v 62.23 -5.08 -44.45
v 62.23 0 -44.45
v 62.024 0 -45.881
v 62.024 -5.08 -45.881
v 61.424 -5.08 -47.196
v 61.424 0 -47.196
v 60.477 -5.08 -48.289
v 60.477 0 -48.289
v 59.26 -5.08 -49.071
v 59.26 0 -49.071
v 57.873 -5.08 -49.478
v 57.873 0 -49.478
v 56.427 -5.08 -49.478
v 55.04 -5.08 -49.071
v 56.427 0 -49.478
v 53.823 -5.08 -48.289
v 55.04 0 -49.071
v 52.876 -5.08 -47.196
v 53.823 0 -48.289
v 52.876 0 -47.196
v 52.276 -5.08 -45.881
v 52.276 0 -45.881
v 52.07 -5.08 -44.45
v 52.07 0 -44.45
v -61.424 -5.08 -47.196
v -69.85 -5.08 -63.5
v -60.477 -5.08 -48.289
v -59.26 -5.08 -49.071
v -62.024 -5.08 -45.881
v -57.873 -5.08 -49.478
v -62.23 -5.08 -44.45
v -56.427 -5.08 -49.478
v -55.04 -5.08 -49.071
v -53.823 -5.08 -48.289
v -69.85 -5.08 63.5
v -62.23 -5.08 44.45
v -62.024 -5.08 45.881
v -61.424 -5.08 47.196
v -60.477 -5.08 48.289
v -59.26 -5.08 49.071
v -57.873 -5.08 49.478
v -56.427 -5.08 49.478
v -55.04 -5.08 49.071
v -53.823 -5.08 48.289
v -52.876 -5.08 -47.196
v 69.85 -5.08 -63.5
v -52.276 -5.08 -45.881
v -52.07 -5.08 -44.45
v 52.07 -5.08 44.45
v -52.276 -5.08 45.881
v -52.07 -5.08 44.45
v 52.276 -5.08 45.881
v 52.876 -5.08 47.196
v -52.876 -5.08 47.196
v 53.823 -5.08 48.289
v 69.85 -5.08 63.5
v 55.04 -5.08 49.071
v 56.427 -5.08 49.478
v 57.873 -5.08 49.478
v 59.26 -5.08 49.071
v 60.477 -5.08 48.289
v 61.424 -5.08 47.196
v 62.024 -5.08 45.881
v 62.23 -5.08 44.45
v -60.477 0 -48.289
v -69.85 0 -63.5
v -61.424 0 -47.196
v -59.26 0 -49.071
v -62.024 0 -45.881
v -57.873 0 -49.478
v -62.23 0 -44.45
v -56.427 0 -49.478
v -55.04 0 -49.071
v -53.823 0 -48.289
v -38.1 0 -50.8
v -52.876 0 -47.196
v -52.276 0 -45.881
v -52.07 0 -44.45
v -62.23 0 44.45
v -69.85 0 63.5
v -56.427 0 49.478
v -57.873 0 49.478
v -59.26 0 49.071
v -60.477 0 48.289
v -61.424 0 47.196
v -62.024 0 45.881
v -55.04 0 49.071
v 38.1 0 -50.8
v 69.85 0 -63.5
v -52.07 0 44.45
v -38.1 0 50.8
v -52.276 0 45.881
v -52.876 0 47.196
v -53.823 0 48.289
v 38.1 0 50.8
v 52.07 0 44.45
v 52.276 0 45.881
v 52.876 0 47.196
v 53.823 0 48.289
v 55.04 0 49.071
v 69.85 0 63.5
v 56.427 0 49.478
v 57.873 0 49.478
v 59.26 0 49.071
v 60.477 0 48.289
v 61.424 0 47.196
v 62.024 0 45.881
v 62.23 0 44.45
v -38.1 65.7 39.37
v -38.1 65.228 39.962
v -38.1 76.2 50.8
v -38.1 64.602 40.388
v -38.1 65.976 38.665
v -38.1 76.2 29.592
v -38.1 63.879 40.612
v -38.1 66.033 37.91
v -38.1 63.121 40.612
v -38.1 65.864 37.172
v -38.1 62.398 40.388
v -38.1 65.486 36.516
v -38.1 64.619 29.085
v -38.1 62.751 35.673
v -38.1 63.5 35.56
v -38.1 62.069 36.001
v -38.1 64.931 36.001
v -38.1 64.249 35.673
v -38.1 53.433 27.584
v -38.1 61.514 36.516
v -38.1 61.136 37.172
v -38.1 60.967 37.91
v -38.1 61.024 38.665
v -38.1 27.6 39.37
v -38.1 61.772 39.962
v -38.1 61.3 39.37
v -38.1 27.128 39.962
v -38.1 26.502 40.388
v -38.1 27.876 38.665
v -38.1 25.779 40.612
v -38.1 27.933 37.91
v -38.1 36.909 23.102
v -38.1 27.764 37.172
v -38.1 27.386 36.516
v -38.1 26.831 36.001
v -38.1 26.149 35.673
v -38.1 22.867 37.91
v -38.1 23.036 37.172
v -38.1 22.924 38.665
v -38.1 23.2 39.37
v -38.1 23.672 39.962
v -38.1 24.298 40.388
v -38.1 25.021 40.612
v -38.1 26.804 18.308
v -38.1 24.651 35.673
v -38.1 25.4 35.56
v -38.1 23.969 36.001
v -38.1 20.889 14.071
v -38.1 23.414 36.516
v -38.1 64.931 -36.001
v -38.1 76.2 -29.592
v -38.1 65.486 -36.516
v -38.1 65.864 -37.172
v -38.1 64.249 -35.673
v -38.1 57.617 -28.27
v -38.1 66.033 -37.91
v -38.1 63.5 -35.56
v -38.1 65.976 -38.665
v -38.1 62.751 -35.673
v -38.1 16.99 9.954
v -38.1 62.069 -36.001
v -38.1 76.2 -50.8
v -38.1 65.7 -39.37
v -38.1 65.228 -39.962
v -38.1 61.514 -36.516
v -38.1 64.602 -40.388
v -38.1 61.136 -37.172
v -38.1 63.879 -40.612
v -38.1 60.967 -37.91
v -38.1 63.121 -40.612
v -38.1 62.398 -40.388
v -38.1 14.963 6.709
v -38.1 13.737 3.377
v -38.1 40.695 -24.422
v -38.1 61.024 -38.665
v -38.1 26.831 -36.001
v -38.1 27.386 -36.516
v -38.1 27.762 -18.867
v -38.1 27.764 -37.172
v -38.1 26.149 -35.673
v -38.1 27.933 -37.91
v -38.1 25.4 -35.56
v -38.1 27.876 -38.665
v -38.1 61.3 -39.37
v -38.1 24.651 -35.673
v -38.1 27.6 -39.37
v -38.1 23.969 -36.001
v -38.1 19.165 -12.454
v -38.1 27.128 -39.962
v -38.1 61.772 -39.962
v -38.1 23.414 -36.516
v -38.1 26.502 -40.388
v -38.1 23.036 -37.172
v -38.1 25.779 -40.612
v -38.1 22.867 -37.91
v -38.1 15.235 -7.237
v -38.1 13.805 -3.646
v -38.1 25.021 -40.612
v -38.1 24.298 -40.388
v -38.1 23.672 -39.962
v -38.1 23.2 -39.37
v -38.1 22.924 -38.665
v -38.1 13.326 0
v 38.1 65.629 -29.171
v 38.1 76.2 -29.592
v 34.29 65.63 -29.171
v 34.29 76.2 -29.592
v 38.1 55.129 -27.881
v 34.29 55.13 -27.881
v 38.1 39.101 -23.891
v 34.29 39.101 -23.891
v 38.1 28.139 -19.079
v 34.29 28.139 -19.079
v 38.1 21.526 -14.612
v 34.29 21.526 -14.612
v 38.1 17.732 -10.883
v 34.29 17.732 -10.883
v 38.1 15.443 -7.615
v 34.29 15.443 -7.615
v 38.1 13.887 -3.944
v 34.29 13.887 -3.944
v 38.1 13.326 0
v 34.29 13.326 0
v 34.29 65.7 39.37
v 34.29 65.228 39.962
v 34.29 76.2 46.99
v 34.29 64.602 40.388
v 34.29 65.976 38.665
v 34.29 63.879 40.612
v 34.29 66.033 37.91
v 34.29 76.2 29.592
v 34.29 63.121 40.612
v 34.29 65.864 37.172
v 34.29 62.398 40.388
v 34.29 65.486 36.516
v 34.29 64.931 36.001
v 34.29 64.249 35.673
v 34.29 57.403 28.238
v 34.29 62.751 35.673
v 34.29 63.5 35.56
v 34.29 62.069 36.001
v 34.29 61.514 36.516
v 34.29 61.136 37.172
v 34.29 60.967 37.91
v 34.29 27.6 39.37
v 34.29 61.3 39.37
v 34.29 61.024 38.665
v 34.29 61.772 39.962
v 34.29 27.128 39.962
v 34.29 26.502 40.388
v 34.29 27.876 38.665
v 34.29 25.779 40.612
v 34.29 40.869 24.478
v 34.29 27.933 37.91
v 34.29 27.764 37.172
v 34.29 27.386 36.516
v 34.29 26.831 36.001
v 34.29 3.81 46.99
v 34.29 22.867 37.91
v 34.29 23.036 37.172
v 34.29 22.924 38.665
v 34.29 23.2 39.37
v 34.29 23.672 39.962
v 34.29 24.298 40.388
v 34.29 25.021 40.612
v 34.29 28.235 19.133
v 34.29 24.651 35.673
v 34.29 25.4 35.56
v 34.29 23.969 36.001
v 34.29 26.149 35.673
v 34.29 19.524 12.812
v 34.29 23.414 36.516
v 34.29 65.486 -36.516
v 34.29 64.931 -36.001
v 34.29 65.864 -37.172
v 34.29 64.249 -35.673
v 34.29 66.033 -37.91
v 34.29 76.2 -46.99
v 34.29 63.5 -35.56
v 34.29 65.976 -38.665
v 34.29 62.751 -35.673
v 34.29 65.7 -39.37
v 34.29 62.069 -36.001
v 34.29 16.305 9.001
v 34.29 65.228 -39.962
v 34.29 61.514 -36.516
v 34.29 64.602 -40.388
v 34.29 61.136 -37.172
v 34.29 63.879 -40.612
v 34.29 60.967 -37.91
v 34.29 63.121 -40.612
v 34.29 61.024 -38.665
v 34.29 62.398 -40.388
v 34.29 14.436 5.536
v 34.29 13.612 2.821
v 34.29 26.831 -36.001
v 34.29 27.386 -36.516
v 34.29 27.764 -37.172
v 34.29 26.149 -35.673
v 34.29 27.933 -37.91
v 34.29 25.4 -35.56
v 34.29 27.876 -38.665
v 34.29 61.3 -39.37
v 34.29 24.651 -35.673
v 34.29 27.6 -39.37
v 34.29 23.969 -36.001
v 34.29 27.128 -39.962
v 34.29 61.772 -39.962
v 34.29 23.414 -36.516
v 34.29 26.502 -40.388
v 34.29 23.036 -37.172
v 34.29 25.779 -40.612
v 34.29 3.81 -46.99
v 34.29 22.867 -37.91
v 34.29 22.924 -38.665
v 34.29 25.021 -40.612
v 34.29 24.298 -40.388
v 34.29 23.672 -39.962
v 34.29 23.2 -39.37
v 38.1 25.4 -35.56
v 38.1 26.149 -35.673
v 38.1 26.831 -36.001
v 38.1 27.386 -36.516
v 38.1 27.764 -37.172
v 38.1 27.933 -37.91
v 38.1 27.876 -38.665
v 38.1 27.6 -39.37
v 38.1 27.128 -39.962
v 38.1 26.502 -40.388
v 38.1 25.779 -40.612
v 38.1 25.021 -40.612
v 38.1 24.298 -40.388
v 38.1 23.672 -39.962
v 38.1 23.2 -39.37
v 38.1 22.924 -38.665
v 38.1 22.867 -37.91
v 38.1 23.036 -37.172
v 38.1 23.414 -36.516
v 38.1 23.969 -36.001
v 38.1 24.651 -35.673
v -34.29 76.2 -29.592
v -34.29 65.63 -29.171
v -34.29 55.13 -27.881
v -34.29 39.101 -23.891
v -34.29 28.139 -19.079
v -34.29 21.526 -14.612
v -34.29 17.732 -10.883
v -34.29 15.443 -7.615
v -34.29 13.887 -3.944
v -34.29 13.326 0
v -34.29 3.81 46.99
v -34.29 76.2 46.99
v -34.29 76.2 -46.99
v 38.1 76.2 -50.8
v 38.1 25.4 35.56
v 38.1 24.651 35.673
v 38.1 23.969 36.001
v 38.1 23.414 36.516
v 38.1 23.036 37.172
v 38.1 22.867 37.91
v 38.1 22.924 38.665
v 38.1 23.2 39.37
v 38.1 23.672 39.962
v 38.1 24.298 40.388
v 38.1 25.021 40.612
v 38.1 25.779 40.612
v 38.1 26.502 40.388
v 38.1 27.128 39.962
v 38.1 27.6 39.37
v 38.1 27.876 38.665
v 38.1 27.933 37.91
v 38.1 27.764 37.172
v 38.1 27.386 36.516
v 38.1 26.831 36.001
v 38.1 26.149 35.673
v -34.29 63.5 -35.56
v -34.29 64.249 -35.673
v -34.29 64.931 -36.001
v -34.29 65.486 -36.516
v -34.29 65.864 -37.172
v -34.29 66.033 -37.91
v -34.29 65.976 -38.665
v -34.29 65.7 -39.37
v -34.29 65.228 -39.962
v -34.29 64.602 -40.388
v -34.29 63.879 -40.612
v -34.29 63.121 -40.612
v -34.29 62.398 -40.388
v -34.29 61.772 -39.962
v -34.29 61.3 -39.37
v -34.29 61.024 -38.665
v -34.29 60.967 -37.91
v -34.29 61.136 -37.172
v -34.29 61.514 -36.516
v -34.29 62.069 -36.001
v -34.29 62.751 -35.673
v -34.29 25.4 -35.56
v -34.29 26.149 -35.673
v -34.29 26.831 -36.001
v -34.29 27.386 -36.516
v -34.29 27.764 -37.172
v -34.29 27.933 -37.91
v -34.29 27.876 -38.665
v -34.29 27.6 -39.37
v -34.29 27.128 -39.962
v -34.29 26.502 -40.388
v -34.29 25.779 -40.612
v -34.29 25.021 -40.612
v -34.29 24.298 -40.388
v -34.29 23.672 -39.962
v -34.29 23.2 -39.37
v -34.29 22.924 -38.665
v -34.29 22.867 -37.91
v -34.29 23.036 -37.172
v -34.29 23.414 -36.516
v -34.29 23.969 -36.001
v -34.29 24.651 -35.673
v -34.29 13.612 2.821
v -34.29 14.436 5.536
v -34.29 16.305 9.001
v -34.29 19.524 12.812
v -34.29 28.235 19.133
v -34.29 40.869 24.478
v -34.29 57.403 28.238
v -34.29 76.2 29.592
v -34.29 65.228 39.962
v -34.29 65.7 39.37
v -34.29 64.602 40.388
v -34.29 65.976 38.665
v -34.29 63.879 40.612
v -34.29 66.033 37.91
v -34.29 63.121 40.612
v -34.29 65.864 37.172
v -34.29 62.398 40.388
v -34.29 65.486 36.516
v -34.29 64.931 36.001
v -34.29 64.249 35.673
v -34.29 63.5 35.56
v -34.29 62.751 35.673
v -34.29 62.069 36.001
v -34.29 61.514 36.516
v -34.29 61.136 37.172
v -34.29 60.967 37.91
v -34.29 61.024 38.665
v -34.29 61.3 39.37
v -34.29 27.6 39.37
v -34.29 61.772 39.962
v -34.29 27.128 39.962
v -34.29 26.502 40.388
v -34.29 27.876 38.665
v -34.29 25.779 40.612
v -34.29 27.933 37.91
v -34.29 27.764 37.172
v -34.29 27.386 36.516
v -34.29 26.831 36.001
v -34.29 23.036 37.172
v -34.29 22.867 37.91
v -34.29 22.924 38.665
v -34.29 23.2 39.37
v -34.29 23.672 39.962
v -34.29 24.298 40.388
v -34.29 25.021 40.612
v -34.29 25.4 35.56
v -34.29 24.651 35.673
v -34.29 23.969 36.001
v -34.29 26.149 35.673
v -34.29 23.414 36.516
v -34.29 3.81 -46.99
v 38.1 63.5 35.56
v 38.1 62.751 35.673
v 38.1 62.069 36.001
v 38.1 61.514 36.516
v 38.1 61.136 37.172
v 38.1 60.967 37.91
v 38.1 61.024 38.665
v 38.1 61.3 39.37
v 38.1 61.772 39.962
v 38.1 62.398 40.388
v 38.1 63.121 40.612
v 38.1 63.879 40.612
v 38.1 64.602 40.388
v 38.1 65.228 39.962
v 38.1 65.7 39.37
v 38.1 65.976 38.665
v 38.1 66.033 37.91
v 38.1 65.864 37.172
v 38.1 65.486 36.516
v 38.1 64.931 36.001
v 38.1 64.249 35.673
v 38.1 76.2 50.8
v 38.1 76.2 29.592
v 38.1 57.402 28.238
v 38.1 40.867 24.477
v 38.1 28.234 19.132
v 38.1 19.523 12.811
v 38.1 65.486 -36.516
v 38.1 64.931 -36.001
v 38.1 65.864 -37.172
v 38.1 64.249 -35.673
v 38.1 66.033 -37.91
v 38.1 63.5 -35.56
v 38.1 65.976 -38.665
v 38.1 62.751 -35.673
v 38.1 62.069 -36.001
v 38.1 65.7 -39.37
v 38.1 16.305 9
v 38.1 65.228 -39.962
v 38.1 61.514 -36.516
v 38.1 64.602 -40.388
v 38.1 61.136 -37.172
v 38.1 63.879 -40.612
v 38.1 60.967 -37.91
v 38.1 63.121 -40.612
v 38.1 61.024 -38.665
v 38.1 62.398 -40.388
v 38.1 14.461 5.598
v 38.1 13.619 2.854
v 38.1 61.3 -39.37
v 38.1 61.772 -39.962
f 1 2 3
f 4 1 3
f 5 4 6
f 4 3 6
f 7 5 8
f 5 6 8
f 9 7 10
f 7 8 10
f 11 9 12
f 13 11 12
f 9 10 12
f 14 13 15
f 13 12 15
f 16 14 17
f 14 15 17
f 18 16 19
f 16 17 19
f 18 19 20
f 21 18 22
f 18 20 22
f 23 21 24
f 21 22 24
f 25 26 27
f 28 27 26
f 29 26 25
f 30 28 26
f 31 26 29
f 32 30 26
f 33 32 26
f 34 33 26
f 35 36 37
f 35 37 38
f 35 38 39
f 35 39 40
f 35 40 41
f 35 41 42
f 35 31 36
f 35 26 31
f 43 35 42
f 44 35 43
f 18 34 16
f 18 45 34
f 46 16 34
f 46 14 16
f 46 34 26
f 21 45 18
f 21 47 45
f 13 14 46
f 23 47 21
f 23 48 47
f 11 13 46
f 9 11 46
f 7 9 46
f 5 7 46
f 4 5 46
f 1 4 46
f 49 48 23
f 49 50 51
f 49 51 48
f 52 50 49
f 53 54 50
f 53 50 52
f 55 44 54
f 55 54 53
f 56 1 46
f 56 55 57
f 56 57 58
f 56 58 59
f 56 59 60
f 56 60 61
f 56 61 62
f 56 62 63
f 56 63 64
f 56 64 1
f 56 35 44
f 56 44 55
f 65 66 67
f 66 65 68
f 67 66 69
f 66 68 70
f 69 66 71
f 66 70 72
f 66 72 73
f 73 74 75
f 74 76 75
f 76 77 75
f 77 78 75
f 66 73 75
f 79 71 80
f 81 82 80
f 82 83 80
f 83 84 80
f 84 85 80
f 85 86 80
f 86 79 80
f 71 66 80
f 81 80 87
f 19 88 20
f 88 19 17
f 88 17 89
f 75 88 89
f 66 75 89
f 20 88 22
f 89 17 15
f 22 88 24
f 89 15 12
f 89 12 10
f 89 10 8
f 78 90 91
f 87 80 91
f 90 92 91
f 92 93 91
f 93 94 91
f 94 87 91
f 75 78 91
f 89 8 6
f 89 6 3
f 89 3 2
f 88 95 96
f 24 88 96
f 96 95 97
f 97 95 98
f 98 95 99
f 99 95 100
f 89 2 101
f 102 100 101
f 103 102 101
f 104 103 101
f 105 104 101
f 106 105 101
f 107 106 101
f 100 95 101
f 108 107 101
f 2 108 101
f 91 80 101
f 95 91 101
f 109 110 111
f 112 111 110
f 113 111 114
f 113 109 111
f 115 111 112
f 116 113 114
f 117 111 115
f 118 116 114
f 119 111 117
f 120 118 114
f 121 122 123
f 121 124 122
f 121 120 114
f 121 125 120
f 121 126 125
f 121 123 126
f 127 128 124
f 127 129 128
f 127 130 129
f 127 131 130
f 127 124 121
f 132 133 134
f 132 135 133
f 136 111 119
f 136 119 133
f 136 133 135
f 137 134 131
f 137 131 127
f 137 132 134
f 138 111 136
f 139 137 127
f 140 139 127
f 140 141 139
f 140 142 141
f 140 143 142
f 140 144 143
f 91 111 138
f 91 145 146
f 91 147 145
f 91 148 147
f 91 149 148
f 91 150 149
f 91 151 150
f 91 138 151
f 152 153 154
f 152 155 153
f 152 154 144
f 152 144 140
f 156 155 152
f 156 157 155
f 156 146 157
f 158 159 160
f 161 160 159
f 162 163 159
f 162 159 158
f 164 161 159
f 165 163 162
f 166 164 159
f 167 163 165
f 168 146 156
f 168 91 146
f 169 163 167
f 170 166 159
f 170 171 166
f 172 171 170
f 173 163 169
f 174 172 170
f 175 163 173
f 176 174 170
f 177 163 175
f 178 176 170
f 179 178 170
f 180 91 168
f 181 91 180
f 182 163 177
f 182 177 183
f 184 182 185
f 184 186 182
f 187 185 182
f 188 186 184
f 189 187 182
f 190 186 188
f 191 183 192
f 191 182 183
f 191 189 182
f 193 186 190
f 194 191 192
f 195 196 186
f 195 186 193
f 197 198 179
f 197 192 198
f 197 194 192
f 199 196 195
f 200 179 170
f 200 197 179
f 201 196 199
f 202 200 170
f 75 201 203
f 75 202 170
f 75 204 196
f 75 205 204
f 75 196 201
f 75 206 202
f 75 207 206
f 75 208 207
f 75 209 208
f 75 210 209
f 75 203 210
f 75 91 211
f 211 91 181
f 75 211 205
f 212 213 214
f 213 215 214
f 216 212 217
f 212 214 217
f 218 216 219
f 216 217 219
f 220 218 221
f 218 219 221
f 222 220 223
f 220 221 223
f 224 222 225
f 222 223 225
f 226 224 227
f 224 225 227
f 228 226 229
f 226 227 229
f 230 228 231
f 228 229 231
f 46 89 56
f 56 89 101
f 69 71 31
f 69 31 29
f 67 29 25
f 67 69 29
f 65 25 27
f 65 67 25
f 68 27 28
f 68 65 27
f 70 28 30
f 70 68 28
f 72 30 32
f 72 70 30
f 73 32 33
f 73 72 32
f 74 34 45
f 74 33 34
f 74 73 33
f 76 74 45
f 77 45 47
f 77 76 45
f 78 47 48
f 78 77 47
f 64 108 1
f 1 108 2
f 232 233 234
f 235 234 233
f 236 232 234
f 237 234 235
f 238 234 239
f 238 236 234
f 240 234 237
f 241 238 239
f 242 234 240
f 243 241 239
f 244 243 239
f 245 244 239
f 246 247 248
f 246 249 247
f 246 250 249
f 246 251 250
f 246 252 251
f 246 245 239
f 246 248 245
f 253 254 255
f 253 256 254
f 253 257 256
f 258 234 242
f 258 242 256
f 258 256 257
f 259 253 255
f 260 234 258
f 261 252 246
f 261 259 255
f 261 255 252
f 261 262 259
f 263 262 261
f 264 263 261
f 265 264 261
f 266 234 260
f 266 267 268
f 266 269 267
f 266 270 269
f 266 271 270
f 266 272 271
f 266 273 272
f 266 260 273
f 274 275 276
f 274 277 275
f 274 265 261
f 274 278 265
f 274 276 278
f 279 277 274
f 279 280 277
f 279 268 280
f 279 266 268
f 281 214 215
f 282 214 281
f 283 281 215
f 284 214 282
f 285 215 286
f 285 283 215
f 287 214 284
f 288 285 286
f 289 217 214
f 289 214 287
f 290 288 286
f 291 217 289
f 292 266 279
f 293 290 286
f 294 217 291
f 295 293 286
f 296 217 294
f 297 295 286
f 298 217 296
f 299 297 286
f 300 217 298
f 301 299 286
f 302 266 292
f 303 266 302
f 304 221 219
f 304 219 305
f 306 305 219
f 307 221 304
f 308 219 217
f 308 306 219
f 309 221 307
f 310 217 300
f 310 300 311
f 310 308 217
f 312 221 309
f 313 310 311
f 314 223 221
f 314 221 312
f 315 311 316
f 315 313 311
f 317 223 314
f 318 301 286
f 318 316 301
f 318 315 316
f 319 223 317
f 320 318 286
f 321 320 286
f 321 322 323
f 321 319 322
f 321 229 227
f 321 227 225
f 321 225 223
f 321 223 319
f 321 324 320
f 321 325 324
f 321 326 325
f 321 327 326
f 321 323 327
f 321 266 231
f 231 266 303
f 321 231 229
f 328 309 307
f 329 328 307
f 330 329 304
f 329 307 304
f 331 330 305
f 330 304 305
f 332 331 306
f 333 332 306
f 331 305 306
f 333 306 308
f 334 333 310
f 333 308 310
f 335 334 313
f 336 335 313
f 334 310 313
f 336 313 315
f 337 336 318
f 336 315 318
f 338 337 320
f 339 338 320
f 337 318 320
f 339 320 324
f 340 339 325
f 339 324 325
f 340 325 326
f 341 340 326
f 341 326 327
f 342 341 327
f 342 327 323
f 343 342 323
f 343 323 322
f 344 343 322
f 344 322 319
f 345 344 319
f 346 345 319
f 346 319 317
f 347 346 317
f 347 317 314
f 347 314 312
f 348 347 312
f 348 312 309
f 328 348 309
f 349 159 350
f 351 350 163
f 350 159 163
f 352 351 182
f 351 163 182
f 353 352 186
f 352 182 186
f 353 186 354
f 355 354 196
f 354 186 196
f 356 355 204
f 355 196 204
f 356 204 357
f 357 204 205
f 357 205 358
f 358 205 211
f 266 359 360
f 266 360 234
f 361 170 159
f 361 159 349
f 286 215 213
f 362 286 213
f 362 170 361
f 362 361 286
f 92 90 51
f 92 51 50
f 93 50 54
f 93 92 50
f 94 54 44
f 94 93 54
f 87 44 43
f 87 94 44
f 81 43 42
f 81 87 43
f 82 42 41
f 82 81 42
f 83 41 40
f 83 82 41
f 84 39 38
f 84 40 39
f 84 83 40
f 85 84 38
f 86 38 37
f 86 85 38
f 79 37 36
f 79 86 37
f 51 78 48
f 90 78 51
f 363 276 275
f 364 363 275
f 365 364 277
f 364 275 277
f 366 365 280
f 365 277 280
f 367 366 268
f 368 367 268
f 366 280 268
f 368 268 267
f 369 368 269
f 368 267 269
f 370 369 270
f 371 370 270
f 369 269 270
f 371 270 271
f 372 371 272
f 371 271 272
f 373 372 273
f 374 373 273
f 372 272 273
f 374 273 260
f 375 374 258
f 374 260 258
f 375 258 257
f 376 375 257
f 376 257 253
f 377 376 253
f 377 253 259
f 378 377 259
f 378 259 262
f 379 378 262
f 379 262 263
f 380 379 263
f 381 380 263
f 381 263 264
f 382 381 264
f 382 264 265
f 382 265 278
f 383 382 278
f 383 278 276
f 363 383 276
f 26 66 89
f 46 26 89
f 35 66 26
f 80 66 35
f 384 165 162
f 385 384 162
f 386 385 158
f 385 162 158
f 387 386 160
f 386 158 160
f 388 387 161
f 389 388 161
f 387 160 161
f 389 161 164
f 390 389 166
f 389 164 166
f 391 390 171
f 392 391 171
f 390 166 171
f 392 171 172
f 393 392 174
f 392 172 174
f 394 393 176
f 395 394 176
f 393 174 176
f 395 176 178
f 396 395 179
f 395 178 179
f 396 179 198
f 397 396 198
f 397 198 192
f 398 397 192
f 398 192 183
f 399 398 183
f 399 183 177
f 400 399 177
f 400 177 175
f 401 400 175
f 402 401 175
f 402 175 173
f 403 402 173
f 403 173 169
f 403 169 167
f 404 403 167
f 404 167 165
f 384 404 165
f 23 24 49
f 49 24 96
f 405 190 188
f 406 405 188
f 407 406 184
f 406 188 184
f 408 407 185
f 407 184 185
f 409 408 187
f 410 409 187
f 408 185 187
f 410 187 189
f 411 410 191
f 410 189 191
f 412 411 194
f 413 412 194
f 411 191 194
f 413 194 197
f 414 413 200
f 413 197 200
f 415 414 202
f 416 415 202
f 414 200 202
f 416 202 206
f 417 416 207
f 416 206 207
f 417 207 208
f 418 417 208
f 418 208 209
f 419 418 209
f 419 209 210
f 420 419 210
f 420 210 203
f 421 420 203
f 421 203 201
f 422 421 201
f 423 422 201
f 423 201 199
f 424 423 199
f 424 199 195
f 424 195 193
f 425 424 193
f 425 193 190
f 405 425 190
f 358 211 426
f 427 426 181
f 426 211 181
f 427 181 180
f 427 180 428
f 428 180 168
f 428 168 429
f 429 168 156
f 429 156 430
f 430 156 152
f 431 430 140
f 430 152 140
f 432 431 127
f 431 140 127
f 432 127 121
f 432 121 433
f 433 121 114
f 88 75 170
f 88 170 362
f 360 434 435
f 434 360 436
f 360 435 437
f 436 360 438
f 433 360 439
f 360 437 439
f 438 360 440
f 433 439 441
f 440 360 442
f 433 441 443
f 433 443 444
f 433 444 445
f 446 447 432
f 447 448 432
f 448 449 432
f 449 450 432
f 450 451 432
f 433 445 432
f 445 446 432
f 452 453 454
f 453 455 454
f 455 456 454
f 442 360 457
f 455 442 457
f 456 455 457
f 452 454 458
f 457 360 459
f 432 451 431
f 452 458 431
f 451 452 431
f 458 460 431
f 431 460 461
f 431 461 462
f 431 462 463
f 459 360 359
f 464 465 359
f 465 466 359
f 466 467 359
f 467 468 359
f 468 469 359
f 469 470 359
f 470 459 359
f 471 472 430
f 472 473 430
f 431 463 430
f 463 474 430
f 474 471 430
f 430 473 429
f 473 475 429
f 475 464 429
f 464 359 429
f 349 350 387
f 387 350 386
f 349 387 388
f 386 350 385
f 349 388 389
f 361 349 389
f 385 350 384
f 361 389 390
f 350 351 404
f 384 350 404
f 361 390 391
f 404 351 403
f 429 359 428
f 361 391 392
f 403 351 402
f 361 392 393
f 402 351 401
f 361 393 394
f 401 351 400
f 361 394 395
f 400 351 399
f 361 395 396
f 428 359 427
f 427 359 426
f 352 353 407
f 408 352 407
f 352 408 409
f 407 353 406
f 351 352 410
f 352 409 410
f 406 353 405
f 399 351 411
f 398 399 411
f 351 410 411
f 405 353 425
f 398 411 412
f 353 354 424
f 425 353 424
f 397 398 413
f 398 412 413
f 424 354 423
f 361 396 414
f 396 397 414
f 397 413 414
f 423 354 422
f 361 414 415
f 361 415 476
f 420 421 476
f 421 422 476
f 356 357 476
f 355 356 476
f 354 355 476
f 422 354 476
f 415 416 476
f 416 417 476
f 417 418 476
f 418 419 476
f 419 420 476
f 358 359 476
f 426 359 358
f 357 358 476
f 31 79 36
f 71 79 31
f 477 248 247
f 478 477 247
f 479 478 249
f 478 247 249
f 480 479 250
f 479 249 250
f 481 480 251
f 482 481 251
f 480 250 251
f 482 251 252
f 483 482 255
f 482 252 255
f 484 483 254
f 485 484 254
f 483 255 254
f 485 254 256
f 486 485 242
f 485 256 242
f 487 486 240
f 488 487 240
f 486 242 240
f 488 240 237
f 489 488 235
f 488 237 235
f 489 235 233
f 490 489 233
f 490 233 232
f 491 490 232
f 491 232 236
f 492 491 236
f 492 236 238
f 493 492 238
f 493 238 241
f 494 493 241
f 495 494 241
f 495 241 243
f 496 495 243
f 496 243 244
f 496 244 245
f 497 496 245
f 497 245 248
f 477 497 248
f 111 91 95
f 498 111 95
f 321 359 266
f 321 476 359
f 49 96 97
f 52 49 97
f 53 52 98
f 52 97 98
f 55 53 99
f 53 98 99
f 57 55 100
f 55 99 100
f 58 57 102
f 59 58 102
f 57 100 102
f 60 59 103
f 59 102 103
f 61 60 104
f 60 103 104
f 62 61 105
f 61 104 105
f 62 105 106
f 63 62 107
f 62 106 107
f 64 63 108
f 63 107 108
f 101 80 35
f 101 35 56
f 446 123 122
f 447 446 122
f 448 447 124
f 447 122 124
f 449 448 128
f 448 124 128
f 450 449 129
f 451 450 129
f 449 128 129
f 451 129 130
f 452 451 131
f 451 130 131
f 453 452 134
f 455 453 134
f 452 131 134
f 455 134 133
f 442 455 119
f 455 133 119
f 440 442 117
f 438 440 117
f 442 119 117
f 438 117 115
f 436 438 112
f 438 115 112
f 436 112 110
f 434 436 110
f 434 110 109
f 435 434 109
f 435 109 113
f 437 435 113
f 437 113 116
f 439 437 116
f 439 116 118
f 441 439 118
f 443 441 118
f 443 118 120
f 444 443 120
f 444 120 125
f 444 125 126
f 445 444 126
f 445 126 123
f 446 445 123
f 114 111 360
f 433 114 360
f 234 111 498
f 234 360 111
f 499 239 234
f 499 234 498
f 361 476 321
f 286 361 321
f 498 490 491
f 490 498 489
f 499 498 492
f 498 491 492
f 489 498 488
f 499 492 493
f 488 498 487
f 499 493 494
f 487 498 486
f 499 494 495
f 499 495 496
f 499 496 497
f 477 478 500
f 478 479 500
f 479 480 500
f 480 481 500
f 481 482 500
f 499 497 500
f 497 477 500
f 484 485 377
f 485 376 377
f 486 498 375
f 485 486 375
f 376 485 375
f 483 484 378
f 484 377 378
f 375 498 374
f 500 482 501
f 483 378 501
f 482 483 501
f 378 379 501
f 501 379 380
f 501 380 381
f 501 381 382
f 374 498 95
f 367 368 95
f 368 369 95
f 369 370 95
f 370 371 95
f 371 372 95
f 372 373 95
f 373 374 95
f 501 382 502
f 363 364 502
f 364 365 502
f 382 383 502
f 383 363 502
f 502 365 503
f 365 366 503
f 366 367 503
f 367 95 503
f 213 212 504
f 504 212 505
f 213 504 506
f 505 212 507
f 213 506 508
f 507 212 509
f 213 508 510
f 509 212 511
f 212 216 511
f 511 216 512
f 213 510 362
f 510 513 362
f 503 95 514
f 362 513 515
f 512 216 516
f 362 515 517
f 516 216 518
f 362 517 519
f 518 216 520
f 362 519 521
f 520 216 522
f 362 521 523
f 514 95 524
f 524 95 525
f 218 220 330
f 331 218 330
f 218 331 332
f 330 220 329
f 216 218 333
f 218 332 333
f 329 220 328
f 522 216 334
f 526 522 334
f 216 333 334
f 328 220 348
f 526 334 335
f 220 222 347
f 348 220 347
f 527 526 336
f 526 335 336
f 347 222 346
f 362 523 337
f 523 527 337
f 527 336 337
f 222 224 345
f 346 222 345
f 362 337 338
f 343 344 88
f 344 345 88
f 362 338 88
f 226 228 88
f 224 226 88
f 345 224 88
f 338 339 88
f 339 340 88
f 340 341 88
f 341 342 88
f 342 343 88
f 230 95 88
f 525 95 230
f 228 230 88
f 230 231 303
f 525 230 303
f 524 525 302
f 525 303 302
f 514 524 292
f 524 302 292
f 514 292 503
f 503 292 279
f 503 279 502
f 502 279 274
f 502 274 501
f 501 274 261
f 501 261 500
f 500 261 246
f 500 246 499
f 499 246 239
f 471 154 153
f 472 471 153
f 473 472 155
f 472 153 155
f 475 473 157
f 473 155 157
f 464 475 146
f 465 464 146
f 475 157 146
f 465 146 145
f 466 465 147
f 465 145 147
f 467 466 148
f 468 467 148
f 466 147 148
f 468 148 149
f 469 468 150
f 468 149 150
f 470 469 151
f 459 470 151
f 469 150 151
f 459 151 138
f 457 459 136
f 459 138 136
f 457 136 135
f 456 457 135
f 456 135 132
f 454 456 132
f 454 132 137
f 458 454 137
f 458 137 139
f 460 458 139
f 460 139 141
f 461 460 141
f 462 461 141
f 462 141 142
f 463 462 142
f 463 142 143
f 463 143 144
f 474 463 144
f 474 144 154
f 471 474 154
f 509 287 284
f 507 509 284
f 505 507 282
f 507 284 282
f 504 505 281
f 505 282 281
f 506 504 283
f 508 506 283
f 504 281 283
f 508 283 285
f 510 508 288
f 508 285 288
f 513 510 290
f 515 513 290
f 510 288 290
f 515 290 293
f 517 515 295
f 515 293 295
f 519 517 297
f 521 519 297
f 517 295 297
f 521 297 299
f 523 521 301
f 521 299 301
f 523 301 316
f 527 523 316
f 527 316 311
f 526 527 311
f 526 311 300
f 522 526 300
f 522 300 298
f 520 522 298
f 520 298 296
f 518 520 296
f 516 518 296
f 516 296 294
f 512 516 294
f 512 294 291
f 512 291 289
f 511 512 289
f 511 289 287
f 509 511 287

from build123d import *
from build123d.topology import SkipClean

# Parameters (mm, degrees)
SKETCH1_W           = 76.2
SKETCH1_H           = 101.6
BOSS_EXTRUDE1_DEPTH = 76.2
SKETCH2_RX          = 62.8740047
SKETCH2_RY          = 29.591838086
CUT_EXTRUDE1_DEPTH  = 120.1365603
SHELL1_T            = -3.81
SKETCH4_R           = 2.54
CUT_EXTRUDE2_DEPTH  = 120.13656047
SKETCH5_W           = 139.7
SKETCH5_H           = 127
BOSS_EXTRUDE2_DEPTH = 5.08
CUT_EXTRUDE3_DEPTH  = 122.316579721


with BuildPart() as part:
    # Sketch1 → Boss-Extrude1 (new body)
    with BuildSketch(Plane(origin=(0, 0, 0), x_dir=(1, 0, 0), z_dir=(0, 1, 0))):
        Rectangle(SKETCH1_W, SKETCH1_H)
    extrude(amount=BOSS_EXTRUDE1_DEPTH)

    # Sketch2 → Cut-Extrude1 (cut, through all)
    with SkipClean():  # the faces are left unmerged after this step: merging them gives an invalid solid
        with BuildSketch(Plane.ZY.offset(38.1)):
            with Locations(Location((0, 76.2), (0, 0, -90))):
                Ellipse(SKETCH2_RX, SKETCH2_RY)
        extrude(amount=-CUT_EXTRUDE1_DEPTH, mode=Mode.SUBTRACT)
    add(part.part.scale(1), mode=Mode.REPLACE)  # the faces are merged on a copy

    # Shell1
    shell1_openings = [part.faces().sort_by_distance(p)[0] for p in [
        (0, 76.2, -40.195919043),
        (0, 31.741364916, -20.924589378),
        (0, 31.741364916, 20.924589378),
        (0, 76.2, 40.195919043),
    ]]
    offset(amount=SHELL1_T, openings=shell1_openings, kind=Kind.INTERSECTION)

    # Sketch4 → Cut-Extrude2 (cut, through all)
    with BuildSketch(Plane.ZY.offset(38.1)):
        with Locations((-38.1, 63.5)):
            Circle(SKETCH4_R)
        with Locations((-38.1, 25.4)):
            Circle(SKETCH4_R)
        with Locations(Location((38.1, 25.4, 0), (0, 0, 180))):
            Circle(SKETCH4_R)
        with Locations(Location((38.1, 63.5, 0), (0, 0, 180))):
            Circle(SKETCH4_R)
    extrude(amount=-CUT_EXTRUDE2_DEPTH, mode=Mode.SUBTRACT)

    # Sketch5 → Boss-Extrude2 (add)
    with BuildSketch(Plane.XZ):
        Rectangle(SKETCH5_W, SKETCH5_H)
    extrude(amount=BOSS_EXTRUDE2_DEPTH)

    # Sketch6 → Cut-Extrude3 (cut, through all)
    with BuildSketch(Plane(origin=(0, 0, 0), x_dir=(1, 0, 0), z_dir=(0, 1, 0))):
        with BuildLine():
            Line((-52.07, 44.45), (-52.07, -44.45))
            ThreePointArc((-52.07, -44.45), (-57.15, -49.53), (-62.23, -44.45))
            Line((-62.23, -44.45), (-62.23, 44.45))
            ThreePointArc((-62.23, 44.45), (-57.15, 49.53), (-52.07, 44.45))
        make_face()
        with BuildLine():
            Line((52.07, 44.45), (52.07, -44.45))
            ThreePointArc((52.07, -44.45), (57.15, -49.53), (62.23, -44.45))
            Line((62.23, -44.45), (62.23, 44.45))
            ThreePointArc((62.23, 44.45), (57.15, 49.53), (52.07, 44.45))
        make_face()
    extrude(amount=-CUT_EXTRUDE3_DEPTH, mode=Mode.SUBTRACT)


solid = part.part
